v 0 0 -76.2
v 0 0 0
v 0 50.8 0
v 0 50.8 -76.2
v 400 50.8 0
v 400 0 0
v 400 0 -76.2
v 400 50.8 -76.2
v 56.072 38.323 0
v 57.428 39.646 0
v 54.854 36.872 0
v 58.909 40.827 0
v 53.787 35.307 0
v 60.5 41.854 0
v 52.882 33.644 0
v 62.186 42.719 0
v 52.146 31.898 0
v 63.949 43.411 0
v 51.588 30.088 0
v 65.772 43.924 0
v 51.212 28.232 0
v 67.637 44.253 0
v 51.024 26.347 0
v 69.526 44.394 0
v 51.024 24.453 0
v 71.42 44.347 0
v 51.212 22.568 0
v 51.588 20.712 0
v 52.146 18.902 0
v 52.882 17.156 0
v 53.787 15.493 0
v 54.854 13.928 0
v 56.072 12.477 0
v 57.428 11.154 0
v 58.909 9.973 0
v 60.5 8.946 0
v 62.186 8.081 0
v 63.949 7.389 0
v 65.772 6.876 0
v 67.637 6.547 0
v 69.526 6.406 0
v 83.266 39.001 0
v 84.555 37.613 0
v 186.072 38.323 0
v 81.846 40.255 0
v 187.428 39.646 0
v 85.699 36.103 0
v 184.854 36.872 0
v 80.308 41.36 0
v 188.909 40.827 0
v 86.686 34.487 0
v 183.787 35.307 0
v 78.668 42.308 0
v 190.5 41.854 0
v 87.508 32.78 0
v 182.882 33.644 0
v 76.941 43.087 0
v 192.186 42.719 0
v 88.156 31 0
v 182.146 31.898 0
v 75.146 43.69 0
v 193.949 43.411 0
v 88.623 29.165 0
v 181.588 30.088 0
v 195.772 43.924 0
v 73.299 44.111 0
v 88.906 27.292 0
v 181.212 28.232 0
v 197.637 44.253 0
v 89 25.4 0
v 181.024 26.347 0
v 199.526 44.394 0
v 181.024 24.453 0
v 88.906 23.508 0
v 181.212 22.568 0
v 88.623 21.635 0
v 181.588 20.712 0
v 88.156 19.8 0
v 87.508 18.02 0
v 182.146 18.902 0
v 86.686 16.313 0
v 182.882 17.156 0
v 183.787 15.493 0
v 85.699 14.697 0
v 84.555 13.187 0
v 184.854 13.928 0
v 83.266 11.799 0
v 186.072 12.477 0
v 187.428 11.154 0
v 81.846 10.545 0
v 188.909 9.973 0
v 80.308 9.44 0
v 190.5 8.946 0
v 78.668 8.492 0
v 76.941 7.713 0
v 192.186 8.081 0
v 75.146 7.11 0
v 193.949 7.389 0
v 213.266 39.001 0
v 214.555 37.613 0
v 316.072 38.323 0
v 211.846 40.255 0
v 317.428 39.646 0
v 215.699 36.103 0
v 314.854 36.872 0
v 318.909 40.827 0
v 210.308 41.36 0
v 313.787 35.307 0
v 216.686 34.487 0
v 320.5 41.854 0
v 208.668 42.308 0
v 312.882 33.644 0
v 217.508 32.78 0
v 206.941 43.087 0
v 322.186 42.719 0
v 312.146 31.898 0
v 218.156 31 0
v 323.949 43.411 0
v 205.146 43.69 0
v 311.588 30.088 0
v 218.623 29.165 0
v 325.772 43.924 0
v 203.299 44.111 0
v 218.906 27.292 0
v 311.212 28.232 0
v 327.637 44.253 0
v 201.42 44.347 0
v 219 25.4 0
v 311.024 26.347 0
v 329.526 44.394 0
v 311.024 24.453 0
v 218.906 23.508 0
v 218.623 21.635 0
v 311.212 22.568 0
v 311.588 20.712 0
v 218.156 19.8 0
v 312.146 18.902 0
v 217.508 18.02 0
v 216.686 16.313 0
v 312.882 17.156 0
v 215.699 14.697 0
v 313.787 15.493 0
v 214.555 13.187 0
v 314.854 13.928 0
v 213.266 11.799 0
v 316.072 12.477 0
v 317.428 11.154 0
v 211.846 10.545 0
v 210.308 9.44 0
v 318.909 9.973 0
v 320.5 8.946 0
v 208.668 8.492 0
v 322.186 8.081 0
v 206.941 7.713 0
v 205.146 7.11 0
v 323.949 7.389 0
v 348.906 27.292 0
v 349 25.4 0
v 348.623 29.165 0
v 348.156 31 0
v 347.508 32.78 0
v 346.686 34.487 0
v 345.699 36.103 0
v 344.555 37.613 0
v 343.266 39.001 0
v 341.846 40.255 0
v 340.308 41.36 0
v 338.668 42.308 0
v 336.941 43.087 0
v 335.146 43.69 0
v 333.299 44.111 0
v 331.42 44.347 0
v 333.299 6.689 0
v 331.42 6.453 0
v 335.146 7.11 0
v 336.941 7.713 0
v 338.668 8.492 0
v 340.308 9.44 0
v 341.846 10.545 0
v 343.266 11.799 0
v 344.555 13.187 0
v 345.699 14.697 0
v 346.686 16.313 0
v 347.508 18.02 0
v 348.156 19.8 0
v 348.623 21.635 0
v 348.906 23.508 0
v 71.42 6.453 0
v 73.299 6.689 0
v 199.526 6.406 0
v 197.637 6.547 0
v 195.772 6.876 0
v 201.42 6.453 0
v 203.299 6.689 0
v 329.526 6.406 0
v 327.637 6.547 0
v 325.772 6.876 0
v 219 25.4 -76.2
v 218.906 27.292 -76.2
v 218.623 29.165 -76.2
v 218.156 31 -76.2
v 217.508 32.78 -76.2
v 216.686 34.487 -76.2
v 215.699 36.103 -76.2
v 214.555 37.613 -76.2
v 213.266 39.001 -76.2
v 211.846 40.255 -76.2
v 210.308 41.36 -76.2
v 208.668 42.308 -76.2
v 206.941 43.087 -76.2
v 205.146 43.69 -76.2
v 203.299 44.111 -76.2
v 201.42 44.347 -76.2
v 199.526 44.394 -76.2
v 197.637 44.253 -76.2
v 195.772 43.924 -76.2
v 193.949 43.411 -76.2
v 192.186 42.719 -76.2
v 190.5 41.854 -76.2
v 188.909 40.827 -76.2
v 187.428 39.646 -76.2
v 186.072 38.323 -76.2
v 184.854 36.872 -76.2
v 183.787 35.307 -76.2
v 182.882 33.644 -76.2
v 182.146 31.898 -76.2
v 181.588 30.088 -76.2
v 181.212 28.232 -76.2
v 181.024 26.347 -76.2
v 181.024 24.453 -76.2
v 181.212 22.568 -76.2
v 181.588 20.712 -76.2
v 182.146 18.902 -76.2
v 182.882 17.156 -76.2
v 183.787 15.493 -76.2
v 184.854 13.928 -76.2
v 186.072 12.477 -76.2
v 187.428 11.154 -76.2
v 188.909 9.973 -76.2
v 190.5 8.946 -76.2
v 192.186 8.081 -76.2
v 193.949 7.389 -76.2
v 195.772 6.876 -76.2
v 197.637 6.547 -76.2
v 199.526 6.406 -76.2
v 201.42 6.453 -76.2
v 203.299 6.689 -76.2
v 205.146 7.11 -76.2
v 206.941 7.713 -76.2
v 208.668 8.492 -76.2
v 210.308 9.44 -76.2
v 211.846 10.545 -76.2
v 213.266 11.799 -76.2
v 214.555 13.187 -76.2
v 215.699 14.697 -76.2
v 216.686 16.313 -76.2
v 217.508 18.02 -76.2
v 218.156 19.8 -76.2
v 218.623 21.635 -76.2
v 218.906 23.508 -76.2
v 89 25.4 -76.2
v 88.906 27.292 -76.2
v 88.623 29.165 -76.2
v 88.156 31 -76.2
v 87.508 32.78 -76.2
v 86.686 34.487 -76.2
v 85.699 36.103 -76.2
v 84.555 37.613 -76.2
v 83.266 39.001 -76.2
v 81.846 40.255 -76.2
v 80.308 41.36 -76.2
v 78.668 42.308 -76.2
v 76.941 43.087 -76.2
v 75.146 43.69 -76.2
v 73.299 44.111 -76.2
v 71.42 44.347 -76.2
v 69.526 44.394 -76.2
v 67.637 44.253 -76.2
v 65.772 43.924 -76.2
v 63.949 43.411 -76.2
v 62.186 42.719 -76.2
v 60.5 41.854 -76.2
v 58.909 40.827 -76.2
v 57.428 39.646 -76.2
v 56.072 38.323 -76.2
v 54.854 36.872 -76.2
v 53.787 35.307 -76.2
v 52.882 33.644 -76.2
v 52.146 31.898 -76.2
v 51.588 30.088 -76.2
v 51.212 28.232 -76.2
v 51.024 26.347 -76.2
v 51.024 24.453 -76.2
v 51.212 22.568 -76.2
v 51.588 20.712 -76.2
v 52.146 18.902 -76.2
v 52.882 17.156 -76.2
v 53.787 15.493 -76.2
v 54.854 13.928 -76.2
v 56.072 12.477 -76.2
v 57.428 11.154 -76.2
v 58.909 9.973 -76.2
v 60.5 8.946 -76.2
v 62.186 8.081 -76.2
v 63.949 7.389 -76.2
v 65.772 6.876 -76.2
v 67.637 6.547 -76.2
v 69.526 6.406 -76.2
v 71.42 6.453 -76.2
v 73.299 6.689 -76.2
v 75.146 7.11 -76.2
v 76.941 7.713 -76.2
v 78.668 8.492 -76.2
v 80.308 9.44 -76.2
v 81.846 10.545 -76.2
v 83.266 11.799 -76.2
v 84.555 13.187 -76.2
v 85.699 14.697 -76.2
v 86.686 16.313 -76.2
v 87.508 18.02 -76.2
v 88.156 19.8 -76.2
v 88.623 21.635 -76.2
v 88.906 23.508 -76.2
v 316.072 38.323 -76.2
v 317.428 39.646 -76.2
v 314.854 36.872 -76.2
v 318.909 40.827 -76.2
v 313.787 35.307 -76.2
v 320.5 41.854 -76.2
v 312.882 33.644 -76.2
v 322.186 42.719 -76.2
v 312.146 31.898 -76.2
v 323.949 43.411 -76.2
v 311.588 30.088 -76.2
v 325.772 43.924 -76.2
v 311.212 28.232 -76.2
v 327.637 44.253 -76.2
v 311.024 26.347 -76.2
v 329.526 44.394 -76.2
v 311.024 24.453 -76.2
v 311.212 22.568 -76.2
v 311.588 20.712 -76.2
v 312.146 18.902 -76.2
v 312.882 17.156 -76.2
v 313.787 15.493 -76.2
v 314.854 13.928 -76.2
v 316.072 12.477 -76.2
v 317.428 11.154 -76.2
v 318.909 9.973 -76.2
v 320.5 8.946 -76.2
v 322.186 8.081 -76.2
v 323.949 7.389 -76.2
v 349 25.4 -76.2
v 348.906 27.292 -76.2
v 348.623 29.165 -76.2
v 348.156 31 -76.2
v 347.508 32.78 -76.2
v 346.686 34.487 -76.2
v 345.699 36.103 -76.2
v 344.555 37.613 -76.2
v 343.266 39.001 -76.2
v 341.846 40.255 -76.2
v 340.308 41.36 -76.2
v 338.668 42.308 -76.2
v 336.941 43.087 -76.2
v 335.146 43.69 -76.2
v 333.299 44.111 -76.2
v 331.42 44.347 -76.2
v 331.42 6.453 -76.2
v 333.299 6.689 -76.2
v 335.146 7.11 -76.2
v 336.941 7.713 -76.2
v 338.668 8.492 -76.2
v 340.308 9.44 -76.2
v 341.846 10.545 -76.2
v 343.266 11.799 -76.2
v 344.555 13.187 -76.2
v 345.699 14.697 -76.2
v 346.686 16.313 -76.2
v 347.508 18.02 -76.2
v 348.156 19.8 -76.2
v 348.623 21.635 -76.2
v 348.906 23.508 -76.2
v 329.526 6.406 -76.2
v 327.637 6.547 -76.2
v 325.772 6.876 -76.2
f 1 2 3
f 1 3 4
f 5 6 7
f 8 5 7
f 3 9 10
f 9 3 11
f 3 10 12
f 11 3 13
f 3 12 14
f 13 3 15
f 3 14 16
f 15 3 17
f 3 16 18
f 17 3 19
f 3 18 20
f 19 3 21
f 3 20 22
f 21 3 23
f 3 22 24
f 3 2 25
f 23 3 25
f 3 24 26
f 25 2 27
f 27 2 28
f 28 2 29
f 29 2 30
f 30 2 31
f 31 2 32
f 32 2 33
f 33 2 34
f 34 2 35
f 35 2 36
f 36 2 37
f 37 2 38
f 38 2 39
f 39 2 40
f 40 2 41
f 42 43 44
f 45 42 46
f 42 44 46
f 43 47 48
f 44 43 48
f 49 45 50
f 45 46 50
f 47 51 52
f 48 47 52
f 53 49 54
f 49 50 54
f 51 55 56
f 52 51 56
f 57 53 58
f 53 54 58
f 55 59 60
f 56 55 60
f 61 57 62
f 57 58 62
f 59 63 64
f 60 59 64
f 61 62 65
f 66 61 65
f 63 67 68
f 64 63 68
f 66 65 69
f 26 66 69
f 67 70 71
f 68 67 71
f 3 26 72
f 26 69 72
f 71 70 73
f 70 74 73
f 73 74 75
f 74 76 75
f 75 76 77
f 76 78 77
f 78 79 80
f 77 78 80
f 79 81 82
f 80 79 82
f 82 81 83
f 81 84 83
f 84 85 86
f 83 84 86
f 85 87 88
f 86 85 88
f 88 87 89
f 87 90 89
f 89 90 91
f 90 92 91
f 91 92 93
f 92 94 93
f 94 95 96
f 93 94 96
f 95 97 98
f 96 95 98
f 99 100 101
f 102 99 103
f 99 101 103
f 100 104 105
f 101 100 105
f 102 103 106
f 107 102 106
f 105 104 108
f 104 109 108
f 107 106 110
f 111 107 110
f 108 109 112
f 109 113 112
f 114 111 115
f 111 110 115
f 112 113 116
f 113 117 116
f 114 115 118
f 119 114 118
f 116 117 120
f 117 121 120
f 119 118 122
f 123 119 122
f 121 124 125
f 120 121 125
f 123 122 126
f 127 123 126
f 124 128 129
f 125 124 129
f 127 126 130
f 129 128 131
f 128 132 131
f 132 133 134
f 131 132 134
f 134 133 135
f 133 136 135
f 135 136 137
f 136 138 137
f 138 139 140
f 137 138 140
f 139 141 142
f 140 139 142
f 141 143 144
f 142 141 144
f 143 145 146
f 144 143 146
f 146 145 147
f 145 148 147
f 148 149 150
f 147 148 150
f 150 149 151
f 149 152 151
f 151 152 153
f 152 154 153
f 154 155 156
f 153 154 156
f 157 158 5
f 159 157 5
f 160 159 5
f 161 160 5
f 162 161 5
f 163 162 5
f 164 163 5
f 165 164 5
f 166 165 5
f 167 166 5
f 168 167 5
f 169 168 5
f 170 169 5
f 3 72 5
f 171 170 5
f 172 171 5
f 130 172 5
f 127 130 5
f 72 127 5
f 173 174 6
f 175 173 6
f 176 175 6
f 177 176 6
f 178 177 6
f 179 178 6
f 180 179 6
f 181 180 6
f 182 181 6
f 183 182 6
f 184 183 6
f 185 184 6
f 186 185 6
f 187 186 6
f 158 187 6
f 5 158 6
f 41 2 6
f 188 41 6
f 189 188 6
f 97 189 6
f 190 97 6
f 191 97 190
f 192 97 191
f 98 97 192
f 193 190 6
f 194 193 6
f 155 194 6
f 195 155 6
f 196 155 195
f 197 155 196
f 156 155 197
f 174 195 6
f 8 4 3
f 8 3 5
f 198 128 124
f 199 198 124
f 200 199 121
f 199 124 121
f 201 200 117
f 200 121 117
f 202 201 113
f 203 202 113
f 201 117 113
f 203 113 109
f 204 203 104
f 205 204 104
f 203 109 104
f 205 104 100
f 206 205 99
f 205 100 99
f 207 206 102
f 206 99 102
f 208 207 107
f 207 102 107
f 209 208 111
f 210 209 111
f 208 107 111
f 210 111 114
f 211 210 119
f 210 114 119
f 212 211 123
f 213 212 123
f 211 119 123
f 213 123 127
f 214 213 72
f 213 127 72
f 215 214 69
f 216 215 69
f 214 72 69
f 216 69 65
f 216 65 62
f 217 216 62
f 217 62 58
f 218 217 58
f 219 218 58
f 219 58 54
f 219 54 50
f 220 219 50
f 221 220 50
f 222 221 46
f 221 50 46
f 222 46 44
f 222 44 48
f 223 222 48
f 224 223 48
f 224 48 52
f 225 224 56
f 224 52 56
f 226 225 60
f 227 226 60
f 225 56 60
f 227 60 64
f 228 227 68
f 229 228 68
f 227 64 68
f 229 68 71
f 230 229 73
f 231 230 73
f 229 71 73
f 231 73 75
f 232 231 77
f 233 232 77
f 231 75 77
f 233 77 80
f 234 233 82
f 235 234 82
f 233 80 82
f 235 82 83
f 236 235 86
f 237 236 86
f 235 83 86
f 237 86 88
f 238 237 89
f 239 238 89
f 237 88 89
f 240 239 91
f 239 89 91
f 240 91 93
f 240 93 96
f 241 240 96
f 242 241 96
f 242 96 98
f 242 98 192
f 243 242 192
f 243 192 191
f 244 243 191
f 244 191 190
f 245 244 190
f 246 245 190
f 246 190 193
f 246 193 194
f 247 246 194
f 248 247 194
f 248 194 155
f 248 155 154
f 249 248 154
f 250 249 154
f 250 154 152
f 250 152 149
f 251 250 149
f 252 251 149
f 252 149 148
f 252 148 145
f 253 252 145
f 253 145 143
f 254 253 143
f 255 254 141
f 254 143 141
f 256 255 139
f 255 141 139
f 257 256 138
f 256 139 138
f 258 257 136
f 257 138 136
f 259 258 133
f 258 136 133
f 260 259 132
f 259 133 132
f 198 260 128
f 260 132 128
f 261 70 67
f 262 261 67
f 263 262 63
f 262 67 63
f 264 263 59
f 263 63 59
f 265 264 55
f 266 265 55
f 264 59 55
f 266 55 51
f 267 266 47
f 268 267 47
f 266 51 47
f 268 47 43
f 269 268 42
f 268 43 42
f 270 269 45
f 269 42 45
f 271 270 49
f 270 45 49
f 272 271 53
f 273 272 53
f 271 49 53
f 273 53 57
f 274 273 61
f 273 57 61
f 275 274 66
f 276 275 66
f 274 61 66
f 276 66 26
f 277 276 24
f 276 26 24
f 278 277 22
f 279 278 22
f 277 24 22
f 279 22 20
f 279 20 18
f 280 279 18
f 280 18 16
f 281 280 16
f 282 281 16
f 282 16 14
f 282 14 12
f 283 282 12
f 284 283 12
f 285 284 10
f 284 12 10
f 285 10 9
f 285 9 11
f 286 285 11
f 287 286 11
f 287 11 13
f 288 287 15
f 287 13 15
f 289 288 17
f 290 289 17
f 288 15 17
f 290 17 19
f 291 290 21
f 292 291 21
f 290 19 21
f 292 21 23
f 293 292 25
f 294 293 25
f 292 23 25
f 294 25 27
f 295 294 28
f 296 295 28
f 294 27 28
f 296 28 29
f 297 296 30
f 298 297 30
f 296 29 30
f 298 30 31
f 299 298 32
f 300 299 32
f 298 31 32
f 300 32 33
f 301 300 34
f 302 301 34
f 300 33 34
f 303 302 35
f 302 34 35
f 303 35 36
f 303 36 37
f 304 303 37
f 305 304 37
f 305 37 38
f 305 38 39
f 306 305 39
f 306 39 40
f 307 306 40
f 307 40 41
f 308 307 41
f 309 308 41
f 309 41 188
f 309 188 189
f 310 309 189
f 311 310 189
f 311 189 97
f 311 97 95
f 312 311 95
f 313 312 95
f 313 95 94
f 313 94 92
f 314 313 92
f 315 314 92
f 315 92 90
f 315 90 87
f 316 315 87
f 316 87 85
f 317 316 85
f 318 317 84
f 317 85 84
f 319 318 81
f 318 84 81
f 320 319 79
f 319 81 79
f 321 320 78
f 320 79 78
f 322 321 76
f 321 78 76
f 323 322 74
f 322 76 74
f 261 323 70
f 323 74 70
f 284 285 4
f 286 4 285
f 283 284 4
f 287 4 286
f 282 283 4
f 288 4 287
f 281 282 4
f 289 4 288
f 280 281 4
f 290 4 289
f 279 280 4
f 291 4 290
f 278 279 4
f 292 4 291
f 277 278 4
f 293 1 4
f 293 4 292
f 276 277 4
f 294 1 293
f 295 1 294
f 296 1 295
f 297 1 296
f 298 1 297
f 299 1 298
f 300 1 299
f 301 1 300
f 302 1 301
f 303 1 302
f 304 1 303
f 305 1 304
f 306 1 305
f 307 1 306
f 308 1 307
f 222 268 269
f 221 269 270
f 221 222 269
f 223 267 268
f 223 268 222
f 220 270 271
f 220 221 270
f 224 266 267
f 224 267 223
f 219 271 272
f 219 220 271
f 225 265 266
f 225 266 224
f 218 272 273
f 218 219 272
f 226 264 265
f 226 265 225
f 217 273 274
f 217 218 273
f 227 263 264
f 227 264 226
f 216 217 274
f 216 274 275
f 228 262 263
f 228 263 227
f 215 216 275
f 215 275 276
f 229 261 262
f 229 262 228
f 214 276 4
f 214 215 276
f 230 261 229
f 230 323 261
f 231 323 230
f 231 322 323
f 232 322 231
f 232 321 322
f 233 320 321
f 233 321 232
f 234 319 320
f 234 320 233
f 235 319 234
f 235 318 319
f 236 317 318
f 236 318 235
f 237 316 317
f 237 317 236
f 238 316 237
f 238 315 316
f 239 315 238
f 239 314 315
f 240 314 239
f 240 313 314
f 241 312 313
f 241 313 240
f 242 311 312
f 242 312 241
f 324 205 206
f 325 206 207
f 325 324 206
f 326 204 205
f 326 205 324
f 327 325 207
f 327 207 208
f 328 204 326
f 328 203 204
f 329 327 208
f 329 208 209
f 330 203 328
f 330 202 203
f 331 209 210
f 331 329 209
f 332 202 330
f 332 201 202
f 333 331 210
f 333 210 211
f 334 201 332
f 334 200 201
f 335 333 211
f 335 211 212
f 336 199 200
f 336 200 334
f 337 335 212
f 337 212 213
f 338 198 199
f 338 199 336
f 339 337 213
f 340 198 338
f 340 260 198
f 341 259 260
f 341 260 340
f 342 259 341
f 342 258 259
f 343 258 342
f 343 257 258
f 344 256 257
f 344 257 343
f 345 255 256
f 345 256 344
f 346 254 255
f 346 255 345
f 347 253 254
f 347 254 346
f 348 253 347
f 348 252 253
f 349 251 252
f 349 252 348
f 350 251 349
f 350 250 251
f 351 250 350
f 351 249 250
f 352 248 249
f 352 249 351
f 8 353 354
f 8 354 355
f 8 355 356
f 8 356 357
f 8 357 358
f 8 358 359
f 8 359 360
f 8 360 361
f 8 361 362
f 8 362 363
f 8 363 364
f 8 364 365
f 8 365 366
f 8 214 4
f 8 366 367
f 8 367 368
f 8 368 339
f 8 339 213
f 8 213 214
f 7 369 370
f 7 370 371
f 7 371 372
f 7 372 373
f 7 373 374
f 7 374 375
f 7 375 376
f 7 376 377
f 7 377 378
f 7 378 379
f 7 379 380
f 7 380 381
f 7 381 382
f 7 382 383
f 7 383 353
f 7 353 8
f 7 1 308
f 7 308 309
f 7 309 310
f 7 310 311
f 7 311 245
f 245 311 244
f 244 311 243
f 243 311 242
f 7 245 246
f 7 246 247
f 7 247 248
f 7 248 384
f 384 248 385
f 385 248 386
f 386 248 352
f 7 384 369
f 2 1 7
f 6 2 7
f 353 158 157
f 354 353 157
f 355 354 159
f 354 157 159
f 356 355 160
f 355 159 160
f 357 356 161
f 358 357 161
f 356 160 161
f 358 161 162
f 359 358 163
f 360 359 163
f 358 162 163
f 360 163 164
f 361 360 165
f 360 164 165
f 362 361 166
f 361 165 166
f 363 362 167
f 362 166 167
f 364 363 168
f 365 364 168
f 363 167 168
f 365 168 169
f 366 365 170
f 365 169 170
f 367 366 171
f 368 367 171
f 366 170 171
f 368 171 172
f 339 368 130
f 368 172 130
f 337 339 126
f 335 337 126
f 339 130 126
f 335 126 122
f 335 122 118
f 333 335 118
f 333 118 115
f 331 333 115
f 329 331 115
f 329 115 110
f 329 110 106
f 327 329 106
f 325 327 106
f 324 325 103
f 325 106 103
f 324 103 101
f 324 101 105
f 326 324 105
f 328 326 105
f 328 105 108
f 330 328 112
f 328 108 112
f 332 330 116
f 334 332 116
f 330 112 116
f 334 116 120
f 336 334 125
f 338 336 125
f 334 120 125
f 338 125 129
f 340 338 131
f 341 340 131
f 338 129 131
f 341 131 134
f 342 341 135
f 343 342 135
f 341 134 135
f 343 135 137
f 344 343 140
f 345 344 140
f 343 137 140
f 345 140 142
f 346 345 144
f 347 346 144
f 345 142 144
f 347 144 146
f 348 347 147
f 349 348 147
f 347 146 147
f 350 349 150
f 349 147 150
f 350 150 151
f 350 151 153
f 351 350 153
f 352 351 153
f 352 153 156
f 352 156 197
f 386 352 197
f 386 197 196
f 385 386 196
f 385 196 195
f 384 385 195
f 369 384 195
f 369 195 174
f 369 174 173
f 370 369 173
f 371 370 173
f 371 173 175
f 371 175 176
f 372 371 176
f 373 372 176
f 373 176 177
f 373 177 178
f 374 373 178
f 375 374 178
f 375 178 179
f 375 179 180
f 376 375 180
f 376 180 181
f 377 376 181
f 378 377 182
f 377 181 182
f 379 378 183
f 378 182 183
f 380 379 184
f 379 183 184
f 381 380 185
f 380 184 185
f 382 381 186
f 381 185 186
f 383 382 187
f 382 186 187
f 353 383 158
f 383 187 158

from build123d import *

# Parameters (mm, degrees)
SKETCH1_W           = 400
SKETCH1_H           = 76.2
BOSS_EXTRUDE1_DEPTH = 50.8
SKETCH2_R           = 19
CUT_EXTRUDE1_DEPTH  = 76.2


with BuildPart() as part:
    # Sketch1 → Boss-Extrude1 (new body)
    with BuildSketch(Plane(origin=(0, 0, 0), x_dir=(1, 0, 0), z_dir=(0, 1, 0))):
        with Locations((200, 38.1)):
            Rectangle(SKETCH1_W, SKETCH1_H)
    extrude(amount=BOSS_EXTRUDE1_DEPTH)

    # Sketch2 → Cut-Extrude1 (cut)
    with BuildSketch(Plane.XY):
        with Locations((70, 25.4)):
            Circle(SKETCH2_R)
        with Locations((200, 25.4)):
            Circle(SKETCH2_R)
        with Locations((330, 25.4)):
            Circle(SKETCH2_R)
    extrude(amount=-CUT_EXTRUDE1_DEPTH, mode=Mode.SUBTRACT)


solid = part.part
